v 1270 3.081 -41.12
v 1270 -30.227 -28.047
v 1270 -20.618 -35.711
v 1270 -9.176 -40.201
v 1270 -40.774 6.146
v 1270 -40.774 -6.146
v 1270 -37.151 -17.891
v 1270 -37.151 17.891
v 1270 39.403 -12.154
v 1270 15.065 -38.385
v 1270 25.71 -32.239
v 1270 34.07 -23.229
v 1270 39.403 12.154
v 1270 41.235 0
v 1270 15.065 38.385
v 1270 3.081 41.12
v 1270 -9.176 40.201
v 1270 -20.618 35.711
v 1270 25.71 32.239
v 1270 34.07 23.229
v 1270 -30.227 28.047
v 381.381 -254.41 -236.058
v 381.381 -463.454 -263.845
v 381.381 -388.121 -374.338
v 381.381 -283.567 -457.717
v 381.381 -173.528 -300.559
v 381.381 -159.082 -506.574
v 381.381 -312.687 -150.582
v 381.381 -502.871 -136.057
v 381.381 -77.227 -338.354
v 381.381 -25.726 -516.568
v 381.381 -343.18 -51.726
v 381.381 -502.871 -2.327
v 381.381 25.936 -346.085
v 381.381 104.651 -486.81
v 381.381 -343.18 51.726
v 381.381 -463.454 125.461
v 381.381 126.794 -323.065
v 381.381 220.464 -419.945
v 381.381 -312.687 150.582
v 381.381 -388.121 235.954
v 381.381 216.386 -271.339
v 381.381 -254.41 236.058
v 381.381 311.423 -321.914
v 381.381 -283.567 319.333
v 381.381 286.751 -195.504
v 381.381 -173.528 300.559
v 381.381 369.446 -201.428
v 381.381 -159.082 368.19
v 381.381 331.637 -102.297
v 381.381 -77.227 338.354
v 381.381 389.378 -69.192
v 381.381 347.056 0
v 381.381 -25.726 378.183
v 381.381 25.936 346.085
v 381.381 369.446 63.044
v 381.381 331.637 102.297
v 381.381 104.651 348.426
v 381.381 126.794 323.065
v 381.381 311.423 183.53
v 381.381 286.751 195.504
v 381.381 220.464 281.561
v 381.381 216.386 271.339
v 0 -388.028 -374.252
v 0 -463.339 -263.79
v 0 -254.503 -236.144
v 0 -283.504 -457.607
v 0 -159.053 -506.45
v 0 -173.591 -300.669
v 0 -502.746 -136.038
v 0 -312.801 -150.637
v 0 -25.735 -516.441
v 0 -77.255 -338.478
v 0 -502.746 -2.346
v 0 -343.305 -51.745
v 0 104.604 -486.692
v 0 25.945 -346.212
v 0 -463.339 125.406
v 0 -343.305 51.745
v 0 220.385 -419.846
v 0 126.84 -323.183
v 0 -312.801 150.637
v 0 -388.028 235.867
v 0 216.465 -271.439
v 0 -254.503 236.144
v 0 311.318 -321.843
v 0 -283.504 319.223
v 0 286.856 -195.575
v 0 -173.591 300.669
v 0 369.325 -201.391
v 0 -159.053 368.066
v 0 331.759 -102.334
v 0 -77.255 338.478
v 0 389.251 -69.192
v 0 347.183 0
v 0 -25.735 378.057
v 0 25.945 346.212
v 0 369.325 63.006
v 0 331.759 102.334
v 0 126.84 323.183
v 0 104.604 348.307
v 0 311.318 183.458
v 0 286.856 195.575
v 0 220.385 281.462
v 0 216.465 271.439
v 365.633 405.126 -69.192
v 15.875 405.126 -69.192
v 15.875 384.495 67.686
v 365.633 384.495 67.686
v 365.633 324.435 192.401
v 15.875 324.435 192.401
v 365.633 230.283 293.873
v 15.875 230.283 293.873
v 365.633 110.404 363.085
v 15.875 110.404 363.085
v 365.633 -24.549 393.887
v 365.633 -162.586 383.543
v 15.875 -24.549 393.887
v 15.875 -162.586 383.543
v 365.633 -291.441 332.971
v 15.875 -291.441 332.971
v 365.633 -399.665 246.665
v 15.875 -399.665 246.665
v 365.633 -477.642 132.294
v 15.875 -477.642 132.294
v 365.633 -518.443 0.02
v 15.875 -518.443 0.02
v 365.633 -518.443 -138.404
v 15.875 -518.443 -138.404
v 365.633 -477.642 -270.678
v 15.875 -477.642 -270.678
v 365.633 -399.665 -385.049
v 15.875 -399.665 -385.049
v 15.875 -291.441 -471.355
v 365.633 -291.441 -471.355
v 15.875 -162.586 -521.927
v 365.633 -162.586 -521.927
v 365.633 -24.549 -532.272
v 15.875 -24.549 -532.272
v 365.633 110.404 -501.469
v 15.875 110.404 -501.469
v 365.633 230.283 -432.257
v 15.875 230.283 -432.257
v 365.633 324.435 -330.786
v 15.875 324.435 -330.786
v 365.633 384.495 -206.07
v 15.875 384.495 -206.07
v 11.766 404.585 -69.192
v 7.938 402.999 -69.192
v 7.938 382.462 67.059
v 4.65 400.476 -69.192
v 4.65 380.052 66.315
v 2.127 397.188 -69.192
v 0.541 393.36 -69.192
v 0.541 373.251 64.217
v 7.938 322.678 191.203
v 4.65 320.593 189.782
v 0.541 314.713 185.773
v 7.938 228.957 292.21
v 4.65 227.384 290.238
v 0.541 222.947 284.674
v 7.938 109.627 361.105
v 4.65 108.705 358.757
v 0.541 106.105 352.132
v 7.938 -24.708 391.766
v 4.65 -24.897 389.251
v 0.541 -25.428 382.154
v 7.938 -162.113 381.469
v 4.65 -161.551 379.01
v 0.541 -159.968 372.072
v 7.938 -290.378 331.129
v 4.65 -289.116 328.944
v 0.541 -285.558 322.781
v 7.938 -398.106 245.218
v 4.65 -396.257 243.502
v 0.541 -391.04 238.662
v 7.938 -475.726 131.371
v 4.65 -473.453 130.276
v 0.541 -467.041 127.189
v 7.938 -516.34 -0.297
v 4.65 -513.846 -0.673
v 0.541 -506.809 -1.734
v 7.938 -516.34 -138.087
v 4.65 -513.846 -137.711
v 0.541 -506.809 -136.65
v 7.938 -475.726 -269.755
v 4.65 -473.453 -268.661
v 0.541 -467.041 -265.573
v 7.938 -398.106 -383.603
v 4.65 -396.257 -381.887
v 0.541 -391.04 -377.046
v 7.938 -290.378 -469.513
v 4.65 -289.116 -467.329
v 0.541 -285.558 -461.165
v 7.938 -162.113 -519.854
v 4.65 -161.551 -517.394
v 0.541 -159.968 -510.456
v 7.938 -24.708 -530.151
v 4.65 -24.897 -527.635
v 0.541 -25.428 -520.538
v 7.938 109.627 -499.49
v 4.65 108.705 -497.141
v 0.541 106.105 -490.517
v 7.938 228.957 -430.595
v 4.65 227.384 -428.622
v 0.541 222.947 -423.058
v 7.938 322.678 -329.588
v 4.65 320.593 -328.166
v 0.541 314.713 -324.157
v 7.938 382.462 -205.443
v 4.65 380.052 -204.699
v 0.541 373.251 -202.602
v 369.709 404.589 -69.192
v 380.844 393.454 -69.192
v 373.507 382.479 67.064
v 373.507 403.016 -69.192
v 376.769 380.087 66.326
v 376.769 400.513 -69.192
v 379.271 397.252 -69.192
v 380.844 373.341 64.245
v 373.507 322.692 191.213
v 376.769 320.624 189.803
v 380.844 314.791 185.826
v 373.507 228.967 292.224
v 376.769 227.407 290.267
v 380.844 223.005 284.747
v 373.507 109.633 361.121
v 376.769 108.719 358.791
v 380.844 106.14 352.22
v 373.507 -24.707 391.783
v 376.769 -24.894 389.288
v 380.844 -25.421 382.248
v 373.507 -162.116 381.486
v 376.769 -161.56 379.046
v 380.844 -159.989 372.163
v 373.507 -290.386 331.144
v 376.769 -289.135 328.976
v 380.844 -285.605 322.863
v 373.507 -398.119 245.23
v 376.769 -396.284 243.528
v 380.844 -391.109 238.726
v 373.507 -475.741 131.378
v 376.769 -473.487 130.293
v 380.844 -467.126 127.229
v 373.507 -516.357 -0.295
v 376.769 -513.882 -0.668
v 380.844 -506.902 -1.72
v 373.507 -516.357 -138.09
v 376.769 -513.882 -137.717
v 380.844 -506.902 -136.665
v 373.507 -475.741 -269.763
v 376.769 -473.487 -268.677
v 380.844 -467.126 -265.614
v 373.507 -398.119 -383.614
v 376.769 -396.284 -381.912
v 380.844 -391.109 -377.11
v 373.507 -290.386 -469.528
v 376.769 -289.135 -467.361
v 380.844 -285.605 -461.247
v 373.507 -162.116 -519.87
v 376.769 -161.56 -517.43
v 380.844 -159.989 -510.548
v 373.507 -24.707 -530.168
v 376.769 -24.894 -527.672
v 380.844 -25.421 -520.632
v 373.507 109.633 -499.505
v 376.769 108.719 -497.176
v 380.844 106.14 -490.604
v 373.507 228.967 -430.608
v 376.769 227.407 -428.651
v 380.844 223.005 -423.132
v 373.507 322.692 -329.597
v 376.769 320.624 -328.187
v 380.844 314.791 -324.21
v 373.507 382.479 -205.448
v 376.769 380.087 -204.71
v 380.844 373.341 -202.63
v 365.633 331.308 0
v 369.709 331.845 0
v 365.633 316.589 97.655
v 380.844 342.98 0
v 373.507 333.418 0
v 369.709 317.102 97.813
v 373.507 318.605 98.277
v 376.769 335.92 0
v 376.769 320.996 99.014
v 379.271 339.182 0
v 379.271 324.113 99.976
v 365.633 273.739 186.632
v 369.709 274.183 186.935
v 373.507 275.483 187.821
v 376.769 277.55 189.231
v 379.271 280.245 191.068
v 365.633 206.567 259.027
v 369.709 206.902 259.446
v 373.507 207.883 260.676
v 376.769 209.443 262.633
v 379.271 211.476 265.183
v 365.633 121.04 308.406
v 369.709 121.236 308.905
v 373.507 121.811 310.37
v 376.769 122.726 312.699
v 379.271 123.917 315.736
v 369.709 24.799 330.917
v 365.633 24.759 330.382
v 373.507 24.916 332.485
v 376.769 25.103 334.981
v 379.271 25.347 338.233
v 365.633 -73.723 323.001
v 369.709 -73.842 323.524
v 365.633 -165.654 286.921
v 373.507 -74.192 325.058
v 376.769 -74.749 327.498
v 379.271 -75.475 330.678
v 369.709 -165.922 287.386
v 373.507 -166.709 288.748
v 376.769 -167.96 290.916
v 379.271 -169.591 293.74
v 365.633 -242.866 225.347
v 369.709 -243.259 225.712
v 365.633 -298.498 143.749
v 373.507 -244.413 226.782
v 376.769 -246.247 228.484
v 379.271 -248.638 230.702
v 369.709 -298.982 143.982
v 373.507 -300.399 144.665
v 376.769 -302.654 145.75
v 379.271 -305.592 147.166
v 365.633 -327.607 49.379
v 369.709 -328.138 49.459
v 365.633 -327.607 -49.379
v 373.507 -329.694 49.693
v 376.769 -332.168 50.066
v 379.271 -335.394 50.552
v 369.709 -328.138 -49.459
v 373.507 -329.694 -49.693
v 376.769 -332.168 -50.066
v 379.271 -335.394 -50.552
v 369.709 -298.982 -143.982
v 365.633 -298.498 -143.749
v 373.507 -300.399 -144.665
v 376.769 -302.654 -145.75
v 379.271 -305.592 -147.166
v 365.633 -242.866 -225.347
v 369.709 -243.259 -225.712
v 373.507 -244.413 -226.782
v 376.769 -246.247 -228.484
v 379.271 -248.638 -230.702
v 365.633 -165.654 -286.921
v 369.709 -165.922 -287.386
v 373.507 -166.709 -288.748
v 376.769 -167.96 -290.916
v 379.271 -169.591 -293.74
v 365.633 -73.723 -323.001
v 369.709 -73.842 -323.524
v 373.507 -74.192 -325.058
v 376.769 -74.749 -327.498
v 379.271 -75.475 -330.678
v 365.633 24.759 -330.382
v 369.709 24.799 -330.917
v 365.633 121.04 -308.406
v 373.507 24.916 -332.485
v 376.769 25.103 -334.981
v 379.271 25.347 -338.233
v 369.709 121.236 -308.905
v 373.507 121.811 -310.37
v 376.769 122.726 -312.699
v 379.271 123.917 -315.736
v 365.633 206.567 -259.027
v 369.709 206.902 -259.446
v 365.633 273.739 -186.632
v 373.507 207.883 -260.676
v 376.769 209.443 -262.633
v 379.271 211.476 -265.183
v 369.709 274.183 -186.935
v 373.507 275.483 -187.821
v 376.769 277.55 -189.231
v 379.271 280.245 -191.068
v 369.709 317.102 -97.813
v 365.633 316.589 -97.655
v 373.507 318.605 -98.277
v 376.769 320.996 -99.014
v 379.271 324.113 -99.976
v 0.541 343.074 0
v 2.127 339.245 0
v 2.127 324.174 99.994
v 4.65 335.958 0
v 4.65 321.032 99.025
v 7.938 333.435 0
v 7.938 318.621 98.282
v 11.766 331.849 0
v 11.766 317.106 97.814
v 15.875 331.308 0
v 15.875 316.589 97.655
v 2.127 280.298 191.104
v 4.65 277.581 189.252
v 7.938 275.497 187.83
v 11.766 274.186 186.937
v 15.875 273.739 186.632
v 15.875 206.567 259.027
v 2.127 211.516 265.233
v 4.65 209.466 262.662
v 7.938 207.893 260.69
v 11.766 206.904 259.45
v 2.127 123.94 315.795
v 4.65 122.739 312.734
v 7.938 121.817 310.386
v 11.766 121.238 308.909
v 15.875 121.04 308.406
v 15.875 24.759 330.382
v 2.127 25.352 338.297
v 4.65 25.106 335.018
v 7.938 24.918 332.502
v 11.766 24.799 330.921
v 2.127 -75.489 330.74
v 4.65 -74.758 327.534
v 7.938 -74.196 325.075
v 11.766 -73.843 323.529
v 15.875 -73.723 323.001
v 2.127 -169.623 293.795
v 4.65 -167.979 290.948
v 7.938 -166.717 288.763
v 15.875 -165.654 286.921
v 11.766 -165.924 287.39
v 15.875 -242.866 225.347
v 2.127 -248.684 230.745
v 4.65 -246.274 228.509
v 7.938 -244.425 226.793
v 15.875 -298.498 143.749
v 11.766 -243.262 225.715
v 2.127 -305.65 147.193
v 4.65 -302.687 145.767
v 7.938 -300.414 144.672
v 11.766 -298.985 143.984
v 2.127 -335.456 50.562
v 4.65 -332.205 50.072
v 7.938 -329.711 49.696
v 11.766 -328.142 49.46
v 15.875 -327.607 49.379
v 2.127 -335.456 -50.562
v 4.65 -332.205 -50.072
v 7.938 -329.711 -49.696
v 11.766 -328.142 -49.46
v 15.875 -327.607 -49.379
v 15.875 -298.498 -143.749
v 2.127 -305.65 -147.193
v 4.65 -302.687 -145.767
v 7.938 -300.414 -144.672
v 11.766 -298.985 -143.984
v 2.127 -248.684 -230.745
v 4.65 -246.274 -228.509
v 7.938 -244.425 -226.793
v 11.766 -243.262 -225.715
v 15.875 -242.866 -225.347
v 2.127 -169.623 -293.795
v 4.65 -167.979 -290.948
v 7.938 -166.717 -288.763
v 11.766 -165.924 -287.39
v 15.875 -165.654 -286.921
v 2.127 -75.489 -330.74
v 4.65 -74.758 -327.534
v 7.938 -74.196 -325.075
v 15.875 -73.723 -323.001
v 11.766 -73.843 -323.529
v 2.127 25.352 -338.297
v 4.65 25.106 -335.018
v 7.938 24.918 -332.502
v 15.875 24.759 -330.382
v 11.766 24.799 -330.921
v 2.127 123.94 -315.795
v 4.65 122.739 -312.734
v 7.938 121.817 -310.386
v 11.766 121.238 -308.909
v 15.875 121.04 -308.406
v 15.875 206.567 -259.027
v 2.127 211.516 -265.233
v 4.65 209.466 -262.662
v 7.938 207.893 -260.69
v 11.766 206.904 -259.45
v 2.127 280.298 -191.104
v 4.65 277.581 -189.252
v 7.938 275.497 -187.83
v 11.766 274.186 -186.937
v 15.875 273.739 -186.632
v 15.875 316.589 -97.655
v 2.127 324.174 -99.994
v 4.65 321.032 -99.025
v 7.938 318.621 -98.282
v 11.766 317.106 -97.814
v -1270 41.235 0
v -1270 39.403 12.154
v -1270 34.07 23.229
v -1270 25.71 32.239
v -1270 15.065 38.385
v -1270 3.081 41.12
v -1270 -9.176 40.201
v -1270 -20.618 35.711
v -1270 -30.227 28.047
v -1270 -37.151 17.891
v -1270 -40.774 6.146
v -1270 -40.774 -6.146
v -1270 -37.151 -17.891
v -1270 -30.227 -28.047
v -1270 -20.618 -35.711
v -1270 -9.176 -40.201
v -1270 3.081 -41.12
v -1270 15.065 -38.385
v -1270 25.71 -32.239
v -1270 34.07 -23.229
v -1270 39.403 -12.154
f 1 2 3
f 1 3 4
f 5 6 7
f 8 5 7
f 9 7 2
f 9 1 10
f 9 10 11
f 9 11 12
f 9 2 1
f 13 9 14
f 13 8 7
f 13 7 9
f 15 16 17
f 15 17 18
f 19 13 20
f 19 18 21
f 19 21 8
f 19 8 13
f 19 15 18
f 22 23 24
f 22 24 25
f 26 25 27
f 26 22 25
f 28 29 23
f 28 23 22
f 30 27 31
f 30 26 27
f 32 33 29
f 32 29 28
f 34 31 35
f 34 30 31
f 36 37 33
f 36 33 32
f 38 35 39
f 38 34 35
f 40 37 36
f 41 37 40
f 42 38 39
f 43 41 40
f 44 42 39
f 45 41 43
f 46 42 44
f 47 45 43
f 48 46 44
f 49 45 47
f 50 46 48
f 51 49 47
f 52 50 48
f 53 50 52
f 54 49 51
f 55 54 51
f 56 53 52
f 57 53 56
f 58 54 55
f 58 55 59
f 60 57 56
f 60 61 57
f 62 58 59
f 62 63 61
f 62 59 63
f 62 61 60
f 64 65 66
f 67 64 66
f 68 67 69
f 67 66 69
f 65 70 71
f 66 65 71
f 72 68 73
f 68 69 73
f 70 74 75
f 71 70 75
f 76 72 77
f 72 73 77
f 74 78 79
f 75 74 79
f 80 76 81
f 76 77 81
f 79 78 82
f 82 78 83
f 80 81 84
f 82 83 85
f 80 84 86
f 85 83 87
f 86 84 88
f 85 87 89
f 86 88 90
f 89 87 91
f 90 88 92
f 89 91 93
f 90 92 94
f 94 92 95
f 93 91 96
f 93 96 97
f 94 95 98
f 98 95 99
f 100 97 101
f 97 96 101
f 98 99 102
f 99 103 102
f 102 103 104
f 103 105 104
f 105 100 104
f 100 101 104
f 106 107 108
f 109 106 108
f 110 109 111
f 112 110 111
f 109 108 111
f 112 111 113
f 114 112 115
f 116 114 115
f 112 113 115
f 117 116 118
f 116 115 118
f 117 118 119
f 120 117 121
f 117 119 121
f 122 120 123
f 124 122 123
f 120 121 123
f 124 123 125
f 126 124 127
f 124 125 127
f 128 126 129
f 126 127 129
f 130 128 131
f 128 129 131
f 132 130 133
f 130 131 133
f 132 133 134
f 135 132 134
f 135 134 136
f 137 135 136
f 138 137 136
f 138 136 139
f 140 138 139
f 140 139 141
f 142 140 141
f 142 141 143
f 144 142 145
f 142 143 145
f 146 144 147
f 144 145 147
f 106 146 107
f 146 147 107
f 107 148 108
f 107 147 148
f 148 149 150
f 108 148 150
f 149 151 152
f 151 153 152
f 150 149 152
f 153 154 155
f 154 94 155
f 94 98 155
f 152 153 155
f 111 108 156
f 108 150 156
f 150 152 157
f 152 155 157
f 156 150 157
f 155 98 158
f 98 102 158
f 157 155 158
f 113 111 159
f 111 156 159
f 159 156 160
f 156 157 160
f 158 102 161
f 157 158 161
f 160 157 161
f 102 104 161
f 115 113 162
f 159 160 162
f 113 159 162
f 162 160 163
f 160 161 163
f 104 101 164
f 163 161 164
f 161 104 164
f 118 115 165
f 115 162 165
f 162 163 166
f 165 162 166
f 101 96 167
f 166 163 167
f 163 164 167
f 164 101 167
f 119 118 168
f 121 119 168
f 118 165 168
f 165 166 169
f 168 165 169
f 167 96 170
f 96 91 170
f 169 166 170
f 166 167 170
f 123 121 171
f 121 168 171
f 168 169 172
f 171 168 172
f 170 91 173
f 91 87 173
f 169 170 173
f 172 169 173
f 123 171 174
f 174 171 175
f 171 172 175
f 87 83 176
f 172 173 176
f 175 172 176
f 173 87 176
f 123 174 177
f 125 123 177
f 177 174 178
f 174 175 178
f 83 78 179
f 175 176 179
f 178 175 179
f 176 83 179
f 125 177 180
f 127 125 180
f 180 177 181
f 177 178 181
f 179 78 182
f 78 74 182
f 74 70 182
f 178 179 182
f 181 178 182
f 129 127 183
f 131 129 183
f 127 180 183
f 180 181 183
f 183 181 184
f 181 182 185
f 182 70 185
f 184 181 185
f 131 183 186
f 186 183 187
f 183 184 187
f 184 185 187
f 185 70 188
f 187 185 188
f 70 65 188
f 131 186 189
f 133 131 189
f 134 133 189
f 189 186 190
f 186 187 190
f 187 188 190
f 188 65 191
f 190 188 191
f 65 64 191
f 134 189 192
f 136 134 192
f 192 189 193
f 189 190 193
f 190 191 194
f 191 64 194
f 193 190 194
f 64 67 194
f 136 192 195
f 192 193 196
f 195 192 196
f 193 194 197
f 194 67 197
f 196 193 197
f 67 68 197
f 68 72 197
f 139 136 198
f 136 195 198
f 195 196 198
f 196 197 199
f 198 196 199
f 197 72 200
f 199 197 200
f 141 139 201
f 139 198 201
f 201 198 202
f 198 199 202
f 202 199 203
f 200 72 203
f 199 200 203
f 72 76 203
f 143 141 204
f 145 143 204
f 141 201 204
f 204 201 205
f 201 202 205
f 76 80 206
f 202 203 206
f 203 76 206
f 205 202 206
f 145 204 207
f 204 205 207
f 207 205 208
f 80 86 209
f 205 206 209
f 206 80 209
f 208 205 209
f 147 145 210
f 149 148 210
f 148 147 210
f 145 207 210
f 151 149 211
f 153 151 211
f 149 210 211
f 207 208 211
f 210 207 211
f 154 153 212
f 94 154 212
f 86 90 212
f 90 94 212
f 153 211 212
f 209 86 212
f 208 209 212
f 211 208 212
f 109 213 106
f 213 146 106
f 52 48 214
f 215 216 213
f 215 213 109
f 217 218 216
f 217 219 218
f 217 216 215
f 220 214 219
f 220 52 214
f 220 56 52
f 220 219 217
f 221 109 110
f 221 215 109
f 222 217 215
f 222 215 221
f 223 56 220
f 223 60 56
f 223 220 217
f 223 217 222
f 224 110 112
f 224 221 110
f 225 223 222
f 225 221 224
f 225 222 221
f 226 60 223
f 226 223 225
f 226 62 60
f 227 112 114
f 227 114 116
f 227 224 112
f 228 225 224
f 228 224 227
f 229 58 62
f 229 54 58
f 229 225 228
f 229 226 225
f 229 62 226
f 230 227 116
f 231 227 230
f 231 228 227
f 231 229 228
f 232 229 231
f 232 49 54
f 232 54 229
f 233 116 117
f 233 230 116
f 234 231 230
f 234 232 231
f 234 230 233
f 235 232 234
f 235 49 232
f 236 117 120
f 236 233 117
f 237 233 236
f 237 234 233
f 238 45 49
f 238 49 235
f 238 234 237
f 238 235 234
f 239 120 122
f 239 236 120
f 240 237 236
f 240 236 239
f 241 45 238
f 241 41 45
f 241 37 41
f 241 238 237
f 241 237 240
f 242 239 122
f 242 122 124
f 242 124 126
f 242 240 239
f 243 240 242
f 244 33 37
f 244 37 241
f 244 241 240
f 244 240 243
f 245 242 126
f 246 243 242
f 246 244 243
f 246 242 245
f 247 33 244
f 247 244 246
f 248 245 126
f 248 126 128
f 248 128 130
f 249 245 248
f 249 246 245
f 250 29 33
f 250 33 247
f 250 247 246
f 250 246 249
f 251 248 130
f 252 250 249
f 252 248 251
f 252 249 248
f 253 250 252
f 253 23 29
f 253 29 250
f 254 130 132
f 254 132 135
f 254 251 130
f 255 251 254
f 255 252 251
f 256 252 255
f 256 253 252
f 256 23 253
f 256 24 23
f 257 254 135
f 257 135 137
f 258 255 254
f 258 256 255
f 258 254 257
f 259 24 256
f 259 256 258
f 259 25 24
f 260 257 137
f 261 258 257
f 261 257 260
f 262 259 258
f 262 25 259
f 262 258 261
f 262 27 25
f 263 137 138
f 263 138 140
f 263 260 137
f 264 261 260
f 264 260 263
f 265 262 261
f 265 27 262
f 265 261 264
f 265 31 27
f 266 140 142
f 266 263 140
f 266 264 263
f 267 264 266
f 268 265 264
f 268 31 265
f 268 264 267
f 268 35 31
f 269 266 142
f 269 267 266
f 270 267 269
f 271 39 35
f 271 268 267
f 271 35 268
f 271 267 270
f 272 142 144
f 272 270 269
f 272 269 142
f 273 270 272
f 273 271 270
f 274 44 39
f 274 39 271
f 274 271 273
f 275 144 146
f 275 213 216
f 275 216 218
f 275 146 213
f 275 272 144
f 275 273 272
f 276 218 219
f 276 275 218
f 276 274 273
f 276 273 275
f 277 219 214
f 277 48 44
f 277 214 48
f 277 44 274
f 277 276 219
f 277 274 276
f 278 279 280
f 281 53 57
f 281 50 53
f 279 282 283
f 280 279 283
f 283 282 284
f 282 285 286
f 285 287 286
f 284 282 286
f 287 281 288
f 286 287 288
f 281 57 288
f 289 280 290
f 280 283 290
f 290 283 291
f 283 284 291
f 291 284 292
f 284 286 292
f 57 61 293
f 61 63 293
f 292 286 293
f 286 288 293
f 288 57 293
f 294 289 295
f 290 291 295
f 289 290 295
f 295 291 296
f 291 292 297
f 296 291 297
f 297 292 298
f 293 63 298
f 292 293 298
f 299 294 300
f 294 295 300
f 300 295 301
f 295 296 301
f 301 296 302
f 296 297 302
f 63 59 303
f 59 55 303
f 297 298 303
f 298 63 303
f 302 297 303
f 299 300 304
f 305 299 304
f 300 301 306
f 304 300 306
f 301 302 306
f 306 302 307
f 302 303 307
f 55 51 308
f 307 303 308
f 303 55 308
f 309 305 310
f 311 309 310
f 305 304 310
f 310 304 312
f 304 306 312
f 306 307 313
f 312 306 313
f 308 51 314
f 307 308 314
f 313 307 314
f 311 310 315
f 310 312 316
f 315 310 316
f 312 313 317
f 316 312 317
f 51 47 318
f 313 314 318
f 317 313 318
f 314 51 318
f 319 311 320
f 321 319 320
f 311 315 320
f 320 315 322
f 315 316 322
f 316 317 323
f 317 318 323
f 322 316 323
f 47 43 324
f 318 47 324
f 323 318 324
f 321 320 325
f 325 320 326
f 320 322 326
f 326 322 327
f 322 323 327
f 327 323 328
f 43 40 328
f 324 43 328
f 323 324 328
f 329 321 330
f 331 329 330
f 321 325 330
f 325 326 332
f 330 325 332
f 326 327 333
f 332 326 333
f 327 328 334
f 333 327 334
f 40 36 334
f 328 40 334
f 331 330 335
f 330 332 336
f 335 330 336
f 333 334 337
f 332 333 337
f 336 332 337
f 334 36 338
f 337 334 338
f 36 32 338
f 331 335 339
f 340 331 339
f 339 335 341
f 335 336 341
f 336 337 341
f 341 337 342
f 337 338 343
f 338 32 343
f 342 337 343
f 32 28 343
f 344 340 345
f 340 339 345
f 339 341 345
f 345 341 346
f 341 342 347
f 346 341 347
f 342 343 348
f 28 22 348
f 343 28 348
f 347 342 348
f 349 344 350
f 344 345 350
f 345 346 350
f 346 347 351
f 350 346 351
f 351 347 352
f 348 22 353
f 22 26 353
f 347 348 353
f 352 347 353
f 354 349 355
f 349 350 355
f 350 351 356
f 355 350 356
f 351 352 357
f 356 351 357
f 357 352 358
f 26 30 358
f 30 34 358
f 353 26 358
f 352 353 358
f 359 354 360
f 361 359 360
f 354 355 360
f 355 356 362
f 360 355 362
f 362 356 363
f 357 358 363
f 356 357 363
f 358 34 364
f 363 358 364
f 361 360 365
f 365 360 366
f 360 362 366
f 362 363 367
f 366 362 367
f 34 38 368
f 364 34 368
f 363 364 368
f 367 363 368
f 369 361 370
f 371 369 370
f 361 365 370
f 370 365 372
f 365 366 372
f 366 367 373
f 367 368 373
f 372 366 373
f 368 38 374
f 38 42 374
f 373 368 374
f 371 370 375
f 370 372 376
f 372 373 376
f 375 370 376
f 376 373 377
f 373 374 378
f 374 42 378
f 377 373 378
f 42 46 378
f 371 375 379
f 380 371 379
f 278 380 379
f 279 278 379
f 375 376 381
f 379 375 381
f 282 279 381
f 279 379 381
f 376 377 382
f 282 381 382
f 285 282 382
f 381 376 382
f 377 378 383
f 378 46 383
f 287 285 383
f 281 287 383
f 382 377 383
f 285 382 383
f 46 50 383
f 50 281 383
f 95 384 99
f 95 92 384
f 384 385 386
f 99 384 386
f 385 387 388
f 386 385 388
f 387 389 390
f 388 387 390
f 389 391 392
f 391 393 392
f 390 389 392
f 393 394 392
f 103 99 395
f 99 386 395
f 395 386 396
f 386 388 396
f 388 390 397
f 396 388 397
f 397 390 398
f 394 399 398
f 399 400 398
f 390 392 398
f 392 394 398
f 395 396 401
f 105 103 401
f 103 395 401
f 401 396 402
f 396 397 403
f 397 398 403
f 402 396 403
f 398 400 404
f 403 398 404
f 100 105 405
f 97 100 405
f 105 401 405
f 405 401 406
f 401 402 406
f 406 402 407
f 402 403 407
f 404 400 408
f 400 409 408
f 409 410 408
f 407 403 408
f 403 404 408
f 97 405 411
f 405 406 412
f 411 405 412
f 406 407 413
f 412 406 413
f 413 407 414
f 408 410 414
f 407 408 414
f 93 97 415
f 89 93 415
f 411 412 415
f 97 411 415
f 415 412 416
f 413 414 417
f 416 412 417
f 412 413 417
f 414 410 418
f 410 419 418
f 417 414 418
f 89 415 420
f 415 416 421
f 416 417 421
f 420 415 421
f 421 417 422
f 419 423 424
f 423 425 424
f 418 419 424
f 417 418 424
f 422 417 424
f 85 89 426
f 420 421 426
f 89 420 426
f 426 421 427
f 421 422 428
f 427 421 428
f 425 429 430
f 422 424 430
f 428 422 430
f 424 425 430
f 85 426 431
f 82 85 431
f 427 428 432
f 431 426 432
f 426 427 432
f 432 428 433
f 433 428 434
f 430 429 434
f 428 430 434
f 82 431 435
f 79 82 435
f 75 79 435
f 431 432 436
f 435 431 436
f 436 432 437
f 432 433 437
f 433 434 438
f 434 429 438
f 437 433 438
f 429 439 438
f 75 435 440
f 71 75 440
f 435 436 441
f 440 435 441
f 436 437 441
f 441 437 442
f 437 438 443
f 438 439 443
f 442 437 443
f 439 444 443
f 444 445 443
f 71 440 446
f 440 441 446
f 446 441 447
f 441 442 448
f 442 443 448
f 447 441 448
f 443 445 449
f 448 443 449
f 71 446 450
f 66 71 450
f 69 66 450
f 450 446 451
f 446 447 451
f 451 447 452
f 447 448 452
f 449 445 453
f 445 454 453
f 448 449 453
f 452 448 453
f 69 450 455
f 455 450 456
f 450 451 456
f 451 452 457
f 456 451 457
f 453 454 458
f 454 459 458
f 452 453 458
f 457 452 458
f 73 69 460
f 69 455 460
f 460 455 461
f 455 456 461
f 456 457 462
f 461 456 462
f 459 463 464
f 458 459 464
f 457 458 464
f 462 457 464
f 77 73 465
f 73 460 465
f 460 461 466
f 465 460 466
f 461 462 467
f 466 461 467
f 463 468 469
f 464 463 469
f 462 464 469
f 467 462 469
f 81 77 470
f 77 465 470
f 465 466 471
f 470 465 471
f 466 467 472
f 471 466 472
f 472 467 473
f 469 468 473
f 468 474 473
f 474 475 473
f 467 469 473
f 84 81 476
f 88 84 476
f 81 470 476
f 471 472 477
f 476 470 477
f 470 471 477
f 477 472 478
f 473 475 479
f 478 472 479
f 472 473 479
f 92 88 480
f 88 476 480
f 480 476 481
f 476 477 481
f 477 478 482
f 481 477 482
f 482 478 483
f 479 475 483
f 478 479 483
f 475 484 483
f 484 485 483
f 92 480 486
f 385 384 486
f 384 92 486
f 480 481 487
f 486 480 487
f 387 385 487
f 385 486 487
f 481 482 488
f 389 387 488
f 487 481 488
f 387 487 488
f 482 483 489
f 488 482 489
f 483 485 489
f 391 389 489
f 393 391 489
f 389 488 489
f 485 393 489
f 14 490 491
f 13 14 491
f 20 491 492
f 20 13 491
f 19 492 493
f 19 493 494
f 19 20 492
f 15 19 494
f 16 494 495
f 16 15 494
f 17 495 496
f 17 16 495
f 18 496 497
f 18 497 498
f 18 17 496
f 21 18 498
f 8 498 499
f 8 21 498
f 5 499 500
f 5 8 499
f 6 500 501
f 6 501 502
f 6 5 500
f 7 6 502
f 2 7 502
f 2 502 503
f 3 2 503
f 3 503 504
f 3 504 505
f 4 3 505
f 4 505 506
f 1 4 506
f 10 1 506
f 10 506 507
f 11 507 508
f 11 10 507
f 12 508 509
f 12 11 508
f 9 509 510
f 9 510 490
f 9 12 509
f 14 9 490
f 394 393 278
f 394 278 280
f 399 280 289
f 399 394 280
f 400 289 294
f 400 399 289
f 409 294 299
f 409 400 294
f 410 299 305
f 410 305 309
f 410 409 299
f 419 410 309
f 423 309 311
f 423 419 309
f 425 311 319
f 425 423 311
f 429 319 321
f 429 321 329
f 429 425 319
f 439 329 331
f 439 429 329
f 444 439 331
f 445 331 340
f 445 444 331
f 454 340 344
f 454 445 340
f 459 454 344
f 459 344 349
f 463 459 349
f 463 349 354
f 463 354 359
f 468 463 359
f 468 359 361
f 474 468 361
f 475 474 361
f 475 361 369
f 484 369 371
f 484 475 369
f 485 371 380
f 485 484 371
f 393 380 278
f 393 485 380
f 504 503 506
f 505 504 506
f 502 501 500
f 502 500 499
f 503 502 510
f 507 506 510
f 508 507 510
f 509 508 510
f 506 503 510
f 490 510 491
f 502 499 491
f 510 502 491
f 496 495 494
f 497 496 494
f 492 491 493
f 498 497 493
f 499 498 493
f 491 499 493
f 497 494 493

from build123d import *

# Parameters (mm, degrees)
F0_R     = 464.377934
F0_R_2   = 331.307916
F1_DEPTH = 381.381
F2_R     = 15.748
F3_R     = 15.875
F4_R     = 41.235015
F5_DEPTH = 1270


with BuildPart() as f1:
    # F0 (on Right) → F1 (new body)
    with BuildSketch(Plane.YZ):
        with Locations((-59.252143, -69.192201)):
            Circle(F0_R)
        Circle(F0_R_2, mode=Mode.SUBTRACT)
    extrude(amount=F1_DEPTH)

    # F2
    f2_edges = [f1.edges().sort_by_distance(p)[0] for p in [
        (381.381, -523.630077, -69.192201),
        (381.381, -331.307916, 0),
    ]]
    fillet(f2_edges, radius=F2_R)

    # F3
    f3_edges = [f1.edges().sort_by_distance(p)[0] for p in [
        (0, -523.630077, -69.192201),
        (0, -331.307916, 0),
    ]]
    fillet(f3_edges, radius=F3_R)


with BuildPart() as f5:
    # F4 (on face) → F5 (new body, symmetric)
    with BuildSketch(Plane.YZ):
        Circle(F4_R)
    extrude(amount=F5_DEPTH, both=True)


solid = Compound([f1.part, f5.part])
